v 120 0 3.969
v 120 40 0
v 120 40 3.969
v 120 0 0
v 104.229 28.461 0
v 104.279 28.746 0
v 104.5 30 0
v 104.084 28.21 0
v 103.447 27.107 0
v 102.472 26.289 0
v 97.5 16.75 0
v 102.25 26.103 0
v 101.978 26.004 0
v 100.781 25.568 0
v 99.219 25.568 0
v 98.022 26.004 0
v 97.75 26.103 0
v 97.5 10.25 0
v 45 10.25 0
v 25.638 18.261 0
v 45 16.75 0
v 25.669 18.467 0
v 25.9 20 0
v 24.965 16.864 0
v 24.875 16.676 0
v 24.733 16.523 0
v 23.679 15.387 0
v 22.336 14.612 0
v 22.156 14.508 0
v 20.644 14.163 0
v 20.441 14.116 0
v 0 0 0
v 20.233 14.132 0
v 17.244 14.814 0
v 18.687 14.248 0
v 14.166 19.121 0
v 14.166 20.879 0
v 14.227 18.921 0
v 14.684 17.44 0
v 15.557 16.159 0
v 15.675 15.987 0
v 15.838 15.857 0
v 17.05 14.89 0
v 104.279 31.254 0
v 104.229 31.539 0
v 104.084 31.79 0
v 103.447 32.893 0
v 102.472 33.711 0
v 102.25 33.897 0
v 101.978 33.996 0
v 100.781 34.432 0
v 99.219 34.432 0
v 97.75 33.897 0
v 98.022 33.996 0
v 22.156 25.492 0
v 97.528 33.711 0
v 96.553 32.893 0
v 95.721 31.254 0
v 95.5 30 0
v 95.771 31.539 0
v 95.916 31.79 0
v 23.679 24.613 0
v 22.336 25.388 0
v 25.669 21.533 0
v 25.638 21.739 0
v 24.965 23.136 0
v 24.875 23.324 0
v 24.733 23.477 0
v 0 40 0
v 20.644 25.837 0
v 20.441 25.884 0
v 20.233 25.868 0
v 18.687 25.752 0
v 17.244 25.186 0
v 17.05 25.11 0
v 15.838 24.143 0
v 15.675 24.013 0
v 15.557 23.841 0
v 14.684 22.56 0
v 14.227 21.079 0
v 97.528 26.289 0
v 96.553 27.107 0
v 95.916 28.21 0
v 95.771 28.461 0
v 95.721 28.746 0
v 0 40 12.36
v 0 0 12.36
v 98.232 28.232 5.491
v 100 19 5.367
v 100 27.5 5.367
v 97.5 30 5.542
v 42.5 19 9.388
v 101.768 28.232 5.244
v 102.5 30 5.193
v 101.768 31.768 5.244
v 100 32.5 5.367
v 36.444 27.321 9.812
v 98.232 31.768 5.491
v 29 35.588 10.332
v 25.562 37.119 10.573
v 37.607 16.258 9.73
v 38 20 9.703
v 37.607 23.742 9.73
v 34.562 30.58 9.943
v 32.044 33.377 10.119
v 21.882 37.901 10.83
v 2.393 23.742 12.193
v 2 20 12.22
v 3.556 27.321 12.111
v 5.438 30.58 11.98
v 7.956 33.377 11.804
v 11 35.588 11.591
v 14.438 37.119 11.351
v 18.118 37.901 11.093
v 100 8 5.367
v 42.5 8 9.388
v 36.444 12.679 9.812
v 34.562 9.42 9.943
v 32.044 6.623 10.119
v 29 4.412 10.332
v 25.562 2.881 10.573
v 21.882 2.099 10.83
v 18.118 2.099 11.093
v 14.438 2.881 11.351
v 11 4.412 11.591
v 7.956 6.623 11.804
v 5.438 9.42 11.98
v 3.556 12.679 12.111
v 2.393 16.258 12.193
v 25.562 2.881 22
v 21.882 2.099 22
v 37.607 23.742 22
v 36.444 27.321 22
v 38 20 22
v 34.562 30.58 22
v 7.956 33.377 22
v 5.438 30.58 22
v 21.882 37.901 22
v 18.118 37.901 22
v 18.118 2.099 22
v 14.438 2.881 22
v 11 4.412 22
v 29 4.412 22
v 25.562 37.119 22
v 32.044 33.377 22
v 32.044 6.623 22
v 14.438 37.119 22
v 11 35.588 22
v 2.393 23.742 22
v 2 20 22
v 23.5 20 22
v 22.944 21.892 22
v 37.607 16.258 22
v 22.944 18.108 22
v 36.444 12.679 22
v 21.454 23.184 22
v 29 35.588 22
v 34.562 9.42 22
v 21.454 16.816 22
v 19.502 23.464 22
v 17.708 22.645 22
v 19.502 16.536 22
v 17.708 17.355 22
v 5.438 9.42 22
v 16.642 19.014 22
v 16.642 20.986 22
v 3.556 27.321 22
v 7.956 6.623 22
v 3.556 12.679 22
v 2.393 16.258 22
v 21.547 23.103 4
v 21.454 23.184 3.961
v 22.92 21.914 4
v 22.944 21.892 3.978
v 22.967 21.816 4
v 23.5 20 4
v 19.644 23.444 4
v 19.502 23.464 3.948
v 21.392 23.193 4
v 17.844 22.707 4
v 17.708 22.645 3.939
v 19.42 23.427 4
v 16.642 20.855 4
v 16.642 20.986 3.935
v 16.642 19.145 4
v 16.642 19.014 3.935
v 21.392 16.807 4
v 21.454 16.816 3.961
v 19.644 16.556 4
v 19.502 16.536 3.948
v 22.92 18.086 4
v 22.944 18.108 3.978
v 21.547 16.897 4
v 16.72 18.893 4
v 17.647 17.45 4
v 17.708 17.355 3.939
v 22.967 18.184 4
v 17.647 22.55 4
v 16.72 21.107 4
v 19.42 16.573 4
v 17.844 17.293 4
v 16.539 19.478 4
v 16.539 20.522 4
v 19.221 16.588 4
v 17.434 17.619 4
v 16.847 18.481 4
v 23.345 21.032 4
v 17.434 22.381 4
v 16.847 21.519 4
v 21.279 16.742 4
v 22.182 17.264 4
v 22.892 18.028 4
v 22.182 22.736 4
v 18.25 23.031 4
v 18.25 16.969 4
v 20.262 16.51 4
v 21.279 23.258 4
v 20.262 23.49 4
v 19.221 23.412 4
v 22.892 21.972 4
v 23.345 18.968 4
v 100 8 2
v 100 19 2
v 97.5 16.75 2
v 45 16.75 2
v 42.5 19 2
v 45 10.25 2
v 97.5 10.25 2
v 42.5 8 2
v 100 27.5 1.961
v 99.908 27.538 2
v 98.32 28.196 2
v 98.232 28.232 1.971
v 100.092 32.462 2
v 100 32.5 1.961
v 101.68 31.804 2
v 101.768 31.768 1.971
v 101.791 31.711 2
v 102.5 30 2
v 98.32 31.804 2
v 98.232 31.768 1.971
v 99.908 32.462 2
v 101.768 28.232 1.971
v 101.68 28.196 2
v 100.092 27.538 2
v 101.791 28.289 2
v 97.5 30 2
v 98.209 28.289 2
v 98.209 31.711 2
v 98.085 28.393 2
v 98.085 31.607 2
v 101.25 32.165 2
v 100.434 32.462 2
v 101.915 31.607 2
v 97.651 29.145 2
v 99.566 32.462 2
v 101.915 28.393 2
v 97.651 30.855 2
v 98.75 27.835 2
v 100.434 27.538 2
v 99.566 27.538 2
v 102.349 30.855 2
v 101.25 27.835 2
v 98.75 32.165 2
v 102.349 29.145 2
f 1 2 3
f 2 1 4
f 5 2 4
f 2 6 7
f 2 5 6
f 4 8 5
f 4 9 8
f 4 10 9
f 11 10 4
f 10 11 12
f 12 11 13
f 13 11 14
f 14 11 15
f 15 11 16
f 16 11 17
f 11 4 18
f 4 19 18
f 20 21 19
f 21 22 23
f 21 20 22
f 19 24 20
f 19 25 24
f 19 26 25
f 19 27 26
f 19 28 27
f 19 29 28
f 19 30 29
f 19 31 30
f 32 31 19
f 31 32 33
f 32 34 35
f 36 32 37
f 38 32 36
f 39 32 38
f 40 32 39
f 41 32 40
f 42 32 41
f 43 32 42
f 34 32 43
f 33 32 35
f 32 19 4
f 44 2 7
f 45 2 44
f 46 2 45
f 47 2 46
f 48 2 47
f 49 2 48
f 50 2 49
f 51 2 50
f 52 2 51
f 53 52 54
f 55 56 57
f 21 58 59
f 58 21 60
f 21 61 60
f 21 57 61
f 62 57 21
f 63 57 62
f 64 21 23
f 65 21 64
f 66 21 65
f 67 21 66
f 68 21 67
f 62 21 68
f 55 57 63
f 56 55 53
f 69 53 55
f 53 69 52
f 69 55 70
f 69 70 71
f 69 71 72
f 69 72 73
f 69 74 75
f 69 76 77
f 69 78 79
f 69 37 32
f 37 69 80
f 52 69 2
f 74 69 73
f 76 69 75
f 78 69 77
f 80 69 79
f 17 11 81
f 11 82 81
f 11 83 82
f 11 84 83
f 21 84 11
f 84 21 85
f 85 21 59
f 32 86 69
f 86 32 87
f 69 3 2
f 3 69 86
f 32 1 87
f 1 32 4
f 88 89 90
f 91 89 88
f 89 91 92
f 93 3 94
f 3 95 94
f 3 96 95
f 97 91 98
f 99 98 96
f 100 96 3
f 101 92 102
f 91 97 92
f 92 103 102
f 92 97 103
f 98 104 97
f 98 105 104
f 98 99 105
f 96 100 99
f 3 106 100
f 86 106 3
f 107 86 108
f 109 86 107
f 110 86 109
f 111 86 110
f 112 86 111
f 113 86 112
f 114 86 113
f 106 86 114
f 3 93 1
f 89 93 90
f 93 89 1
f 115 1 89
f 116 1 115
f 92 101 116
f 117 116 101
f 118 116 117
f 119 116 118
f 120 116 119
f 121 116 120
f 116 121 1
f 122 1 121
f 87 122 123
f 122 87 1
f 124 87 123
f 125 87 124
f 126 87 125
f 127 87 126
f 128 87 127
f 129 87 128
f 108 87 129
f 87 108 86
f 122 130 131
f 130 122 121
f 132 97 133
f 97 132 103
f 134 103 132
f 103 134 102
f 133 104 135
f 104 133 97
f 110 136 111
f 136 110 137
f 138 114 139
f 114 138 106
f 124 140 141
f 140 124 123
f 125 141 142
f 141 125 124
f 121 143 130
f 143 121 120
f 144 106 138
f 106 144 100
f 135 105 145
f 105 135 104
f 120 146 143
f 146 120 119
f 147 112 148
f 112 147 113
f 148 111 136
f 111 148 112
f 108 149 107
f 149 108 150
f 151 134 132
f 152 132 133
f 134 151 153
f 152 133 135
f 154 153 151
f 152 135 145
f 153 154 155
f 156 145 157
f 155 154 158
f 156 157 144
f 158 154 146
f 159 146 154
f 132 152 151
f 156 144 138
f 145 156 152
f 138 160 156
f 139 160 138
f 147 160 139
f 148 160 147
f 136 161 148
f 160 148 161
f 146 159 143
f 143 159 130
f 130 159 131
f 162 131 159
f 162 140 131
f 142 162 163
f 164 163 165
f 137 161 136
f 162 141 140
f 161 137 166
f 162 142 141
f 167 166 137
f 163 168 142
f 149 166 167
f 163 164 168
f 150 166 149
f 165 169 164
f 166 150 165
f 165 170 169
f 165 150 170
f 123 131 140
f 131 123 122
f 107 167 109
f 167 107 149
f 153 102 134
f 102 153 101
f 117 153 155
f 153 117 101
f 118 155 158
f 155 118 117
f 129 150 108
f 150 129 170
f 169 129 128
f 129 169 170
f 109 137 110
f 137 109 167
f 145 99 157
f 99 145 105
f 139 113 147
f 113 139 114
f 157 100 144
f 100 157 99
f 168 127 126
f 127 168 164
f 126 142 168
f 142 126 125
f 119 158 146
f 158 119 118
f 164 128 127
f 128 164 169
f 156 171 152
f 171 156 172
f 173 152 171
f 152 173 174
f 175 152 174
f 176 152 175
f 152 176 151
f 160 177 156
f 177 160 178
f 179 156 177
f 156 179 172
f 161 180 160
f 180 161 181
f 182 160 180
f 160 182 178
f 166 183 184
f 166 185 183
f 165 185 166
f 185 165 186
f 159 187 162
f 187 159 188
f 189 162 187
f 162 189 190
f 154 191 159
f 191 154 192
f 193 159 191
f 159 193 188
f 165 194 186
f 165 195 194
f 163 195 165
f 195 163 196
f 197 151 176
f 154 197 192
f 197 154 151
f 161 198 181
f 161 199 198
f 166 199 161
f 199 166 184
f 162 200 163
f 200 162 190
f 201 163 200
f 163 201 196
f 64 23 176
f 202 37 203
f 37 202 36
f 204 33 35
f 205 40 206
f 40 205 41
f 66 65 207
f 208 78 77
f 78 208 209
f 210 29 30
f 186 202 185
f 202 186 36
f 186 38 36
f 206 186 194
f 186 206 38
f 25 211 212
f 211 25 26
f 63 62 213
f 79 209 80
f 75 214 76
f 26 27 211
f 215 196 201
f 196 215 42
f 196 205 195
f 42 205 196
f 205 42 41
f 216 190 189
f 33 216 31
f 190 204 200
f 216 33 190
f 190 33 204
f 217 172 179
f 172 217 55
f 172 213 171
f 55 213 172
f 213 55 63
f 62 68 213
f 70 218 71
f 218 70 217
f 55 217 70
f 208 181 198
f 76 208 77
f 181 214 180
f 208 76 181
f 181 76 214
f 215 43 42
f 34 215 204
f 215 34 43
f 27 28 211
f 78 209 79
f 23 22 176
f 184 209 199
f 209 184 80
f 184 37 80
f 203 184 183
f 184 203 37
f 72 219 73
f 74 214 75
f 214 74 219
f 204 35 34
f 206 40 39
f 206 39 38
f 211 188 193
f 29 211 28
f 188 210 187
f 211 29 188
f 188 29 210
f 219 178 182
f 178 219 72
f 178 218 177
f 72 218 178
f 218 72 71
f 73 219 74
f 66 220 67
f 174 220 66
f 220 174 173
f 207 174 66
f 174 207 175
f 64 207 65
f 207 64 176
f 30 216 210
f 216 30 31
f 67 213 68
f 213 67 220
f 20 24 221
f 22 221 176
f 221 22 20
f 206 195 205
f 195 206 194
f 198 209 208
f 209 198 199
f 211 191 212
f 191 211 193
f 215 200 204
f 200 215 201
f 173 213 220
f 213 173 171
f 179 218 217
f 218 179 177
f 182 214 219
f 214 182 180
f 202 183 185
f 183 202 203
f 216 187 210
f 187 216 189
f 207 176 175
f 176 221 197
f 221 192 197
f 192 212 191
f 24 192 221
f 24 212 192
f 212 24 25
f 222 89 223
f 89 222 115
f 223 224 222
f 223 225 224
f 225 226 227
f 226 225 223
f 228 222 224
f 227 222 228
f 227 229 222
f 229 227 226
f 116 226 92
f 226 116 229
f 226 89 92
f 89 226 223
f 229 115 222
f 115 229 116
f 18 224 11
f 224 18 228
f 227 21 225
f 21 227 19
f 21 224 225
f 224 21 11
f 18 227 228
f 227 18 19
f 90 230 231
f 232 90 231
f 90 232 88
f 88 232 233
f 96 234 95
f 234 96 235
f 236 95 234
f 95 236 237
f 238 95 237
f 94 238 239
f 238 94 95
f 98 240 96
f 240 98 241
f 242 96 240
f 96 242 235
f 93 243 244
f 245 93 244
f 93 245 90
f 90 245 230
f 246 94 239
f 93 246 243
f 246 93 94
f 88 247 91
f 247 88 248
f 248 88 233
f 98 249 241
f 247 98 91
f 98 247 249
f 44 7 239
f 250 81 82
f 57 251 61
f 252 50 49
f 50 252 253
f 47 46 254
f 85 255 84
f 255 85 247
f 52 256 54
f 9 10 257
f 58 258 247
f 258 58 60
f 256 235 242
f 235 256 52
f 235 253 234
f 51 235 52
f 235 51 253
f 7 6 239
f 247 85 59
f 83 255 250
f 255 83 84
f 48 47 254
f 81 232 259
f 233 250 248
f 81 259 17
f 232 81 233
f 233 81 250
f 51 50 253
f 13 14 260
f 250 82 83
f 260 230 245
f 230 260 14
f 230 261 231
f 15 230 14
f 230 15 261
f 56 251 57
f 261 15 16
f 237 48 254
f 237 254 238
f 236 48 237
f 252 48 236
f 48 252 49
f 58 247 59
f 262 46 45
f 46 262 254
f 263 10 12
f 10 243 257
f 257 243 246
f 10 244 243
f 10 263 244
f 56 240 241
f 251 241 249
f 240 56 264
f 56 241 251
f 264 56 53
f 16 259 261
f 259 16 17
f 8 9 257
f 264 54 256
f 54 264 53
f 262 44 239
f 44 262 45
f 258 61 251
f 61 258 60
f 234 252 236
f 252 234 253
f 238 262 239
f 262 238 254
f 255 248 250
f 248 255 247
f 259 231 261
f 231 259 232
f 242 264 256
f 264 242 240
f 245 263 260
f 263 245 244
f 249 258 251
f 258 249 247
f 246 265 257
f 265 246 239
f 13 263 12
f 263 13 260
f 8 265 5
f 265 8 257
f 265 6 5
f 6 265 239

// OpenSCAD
module all(){
difference(){
color("red")
cube([120,40,22.5]);
    translate([-2,-1,12.5])
rotate([0,4,0])
color("blue")
cube([130,45,20]);
};
translate([20,20,0])
color ("green")
cylinder(22,18,18);
};

//translate([0,50,0]){
difference(){
    all();
    translate([20,20,-1])
    cylinder(37.5,3.5,3.5);
    translate([20,20,-1])
    cylinder(5,6.5,3.5);
    translate([42.5,8,2])
    color("aqua")
    cube([57.5,11,10]);
    translate([45,10.25,-1])
    color("aqua")
    cube([52.5,6.5,10]);
    
    translate([100,30,-1])
    cylinder(15,2.5,2.5);
    translate([100,30,-1])
    cylinder(3,5.5,2.5);

};
//};
//difference(){
//    all();
//    translate([20,20,-1])
//    cylinder(32.5,3.5,3.5);
//    translate([20,20,-1])
//    cylinder(5,6.5,3.5);
//    translate([42.5,21,2])
//    color("aqua")
//    cube([57.5,11,10]);
//    translate([45,23.25,-1])
//    color("aqua")
//    cube([52.5,6.5,10]);
//    translate([100,10,-1])
//    cylinder(15,2.5,2.5);
//    translate([100,10,-1])
//    cylinder(3,5.5,2.5);
//
//};
